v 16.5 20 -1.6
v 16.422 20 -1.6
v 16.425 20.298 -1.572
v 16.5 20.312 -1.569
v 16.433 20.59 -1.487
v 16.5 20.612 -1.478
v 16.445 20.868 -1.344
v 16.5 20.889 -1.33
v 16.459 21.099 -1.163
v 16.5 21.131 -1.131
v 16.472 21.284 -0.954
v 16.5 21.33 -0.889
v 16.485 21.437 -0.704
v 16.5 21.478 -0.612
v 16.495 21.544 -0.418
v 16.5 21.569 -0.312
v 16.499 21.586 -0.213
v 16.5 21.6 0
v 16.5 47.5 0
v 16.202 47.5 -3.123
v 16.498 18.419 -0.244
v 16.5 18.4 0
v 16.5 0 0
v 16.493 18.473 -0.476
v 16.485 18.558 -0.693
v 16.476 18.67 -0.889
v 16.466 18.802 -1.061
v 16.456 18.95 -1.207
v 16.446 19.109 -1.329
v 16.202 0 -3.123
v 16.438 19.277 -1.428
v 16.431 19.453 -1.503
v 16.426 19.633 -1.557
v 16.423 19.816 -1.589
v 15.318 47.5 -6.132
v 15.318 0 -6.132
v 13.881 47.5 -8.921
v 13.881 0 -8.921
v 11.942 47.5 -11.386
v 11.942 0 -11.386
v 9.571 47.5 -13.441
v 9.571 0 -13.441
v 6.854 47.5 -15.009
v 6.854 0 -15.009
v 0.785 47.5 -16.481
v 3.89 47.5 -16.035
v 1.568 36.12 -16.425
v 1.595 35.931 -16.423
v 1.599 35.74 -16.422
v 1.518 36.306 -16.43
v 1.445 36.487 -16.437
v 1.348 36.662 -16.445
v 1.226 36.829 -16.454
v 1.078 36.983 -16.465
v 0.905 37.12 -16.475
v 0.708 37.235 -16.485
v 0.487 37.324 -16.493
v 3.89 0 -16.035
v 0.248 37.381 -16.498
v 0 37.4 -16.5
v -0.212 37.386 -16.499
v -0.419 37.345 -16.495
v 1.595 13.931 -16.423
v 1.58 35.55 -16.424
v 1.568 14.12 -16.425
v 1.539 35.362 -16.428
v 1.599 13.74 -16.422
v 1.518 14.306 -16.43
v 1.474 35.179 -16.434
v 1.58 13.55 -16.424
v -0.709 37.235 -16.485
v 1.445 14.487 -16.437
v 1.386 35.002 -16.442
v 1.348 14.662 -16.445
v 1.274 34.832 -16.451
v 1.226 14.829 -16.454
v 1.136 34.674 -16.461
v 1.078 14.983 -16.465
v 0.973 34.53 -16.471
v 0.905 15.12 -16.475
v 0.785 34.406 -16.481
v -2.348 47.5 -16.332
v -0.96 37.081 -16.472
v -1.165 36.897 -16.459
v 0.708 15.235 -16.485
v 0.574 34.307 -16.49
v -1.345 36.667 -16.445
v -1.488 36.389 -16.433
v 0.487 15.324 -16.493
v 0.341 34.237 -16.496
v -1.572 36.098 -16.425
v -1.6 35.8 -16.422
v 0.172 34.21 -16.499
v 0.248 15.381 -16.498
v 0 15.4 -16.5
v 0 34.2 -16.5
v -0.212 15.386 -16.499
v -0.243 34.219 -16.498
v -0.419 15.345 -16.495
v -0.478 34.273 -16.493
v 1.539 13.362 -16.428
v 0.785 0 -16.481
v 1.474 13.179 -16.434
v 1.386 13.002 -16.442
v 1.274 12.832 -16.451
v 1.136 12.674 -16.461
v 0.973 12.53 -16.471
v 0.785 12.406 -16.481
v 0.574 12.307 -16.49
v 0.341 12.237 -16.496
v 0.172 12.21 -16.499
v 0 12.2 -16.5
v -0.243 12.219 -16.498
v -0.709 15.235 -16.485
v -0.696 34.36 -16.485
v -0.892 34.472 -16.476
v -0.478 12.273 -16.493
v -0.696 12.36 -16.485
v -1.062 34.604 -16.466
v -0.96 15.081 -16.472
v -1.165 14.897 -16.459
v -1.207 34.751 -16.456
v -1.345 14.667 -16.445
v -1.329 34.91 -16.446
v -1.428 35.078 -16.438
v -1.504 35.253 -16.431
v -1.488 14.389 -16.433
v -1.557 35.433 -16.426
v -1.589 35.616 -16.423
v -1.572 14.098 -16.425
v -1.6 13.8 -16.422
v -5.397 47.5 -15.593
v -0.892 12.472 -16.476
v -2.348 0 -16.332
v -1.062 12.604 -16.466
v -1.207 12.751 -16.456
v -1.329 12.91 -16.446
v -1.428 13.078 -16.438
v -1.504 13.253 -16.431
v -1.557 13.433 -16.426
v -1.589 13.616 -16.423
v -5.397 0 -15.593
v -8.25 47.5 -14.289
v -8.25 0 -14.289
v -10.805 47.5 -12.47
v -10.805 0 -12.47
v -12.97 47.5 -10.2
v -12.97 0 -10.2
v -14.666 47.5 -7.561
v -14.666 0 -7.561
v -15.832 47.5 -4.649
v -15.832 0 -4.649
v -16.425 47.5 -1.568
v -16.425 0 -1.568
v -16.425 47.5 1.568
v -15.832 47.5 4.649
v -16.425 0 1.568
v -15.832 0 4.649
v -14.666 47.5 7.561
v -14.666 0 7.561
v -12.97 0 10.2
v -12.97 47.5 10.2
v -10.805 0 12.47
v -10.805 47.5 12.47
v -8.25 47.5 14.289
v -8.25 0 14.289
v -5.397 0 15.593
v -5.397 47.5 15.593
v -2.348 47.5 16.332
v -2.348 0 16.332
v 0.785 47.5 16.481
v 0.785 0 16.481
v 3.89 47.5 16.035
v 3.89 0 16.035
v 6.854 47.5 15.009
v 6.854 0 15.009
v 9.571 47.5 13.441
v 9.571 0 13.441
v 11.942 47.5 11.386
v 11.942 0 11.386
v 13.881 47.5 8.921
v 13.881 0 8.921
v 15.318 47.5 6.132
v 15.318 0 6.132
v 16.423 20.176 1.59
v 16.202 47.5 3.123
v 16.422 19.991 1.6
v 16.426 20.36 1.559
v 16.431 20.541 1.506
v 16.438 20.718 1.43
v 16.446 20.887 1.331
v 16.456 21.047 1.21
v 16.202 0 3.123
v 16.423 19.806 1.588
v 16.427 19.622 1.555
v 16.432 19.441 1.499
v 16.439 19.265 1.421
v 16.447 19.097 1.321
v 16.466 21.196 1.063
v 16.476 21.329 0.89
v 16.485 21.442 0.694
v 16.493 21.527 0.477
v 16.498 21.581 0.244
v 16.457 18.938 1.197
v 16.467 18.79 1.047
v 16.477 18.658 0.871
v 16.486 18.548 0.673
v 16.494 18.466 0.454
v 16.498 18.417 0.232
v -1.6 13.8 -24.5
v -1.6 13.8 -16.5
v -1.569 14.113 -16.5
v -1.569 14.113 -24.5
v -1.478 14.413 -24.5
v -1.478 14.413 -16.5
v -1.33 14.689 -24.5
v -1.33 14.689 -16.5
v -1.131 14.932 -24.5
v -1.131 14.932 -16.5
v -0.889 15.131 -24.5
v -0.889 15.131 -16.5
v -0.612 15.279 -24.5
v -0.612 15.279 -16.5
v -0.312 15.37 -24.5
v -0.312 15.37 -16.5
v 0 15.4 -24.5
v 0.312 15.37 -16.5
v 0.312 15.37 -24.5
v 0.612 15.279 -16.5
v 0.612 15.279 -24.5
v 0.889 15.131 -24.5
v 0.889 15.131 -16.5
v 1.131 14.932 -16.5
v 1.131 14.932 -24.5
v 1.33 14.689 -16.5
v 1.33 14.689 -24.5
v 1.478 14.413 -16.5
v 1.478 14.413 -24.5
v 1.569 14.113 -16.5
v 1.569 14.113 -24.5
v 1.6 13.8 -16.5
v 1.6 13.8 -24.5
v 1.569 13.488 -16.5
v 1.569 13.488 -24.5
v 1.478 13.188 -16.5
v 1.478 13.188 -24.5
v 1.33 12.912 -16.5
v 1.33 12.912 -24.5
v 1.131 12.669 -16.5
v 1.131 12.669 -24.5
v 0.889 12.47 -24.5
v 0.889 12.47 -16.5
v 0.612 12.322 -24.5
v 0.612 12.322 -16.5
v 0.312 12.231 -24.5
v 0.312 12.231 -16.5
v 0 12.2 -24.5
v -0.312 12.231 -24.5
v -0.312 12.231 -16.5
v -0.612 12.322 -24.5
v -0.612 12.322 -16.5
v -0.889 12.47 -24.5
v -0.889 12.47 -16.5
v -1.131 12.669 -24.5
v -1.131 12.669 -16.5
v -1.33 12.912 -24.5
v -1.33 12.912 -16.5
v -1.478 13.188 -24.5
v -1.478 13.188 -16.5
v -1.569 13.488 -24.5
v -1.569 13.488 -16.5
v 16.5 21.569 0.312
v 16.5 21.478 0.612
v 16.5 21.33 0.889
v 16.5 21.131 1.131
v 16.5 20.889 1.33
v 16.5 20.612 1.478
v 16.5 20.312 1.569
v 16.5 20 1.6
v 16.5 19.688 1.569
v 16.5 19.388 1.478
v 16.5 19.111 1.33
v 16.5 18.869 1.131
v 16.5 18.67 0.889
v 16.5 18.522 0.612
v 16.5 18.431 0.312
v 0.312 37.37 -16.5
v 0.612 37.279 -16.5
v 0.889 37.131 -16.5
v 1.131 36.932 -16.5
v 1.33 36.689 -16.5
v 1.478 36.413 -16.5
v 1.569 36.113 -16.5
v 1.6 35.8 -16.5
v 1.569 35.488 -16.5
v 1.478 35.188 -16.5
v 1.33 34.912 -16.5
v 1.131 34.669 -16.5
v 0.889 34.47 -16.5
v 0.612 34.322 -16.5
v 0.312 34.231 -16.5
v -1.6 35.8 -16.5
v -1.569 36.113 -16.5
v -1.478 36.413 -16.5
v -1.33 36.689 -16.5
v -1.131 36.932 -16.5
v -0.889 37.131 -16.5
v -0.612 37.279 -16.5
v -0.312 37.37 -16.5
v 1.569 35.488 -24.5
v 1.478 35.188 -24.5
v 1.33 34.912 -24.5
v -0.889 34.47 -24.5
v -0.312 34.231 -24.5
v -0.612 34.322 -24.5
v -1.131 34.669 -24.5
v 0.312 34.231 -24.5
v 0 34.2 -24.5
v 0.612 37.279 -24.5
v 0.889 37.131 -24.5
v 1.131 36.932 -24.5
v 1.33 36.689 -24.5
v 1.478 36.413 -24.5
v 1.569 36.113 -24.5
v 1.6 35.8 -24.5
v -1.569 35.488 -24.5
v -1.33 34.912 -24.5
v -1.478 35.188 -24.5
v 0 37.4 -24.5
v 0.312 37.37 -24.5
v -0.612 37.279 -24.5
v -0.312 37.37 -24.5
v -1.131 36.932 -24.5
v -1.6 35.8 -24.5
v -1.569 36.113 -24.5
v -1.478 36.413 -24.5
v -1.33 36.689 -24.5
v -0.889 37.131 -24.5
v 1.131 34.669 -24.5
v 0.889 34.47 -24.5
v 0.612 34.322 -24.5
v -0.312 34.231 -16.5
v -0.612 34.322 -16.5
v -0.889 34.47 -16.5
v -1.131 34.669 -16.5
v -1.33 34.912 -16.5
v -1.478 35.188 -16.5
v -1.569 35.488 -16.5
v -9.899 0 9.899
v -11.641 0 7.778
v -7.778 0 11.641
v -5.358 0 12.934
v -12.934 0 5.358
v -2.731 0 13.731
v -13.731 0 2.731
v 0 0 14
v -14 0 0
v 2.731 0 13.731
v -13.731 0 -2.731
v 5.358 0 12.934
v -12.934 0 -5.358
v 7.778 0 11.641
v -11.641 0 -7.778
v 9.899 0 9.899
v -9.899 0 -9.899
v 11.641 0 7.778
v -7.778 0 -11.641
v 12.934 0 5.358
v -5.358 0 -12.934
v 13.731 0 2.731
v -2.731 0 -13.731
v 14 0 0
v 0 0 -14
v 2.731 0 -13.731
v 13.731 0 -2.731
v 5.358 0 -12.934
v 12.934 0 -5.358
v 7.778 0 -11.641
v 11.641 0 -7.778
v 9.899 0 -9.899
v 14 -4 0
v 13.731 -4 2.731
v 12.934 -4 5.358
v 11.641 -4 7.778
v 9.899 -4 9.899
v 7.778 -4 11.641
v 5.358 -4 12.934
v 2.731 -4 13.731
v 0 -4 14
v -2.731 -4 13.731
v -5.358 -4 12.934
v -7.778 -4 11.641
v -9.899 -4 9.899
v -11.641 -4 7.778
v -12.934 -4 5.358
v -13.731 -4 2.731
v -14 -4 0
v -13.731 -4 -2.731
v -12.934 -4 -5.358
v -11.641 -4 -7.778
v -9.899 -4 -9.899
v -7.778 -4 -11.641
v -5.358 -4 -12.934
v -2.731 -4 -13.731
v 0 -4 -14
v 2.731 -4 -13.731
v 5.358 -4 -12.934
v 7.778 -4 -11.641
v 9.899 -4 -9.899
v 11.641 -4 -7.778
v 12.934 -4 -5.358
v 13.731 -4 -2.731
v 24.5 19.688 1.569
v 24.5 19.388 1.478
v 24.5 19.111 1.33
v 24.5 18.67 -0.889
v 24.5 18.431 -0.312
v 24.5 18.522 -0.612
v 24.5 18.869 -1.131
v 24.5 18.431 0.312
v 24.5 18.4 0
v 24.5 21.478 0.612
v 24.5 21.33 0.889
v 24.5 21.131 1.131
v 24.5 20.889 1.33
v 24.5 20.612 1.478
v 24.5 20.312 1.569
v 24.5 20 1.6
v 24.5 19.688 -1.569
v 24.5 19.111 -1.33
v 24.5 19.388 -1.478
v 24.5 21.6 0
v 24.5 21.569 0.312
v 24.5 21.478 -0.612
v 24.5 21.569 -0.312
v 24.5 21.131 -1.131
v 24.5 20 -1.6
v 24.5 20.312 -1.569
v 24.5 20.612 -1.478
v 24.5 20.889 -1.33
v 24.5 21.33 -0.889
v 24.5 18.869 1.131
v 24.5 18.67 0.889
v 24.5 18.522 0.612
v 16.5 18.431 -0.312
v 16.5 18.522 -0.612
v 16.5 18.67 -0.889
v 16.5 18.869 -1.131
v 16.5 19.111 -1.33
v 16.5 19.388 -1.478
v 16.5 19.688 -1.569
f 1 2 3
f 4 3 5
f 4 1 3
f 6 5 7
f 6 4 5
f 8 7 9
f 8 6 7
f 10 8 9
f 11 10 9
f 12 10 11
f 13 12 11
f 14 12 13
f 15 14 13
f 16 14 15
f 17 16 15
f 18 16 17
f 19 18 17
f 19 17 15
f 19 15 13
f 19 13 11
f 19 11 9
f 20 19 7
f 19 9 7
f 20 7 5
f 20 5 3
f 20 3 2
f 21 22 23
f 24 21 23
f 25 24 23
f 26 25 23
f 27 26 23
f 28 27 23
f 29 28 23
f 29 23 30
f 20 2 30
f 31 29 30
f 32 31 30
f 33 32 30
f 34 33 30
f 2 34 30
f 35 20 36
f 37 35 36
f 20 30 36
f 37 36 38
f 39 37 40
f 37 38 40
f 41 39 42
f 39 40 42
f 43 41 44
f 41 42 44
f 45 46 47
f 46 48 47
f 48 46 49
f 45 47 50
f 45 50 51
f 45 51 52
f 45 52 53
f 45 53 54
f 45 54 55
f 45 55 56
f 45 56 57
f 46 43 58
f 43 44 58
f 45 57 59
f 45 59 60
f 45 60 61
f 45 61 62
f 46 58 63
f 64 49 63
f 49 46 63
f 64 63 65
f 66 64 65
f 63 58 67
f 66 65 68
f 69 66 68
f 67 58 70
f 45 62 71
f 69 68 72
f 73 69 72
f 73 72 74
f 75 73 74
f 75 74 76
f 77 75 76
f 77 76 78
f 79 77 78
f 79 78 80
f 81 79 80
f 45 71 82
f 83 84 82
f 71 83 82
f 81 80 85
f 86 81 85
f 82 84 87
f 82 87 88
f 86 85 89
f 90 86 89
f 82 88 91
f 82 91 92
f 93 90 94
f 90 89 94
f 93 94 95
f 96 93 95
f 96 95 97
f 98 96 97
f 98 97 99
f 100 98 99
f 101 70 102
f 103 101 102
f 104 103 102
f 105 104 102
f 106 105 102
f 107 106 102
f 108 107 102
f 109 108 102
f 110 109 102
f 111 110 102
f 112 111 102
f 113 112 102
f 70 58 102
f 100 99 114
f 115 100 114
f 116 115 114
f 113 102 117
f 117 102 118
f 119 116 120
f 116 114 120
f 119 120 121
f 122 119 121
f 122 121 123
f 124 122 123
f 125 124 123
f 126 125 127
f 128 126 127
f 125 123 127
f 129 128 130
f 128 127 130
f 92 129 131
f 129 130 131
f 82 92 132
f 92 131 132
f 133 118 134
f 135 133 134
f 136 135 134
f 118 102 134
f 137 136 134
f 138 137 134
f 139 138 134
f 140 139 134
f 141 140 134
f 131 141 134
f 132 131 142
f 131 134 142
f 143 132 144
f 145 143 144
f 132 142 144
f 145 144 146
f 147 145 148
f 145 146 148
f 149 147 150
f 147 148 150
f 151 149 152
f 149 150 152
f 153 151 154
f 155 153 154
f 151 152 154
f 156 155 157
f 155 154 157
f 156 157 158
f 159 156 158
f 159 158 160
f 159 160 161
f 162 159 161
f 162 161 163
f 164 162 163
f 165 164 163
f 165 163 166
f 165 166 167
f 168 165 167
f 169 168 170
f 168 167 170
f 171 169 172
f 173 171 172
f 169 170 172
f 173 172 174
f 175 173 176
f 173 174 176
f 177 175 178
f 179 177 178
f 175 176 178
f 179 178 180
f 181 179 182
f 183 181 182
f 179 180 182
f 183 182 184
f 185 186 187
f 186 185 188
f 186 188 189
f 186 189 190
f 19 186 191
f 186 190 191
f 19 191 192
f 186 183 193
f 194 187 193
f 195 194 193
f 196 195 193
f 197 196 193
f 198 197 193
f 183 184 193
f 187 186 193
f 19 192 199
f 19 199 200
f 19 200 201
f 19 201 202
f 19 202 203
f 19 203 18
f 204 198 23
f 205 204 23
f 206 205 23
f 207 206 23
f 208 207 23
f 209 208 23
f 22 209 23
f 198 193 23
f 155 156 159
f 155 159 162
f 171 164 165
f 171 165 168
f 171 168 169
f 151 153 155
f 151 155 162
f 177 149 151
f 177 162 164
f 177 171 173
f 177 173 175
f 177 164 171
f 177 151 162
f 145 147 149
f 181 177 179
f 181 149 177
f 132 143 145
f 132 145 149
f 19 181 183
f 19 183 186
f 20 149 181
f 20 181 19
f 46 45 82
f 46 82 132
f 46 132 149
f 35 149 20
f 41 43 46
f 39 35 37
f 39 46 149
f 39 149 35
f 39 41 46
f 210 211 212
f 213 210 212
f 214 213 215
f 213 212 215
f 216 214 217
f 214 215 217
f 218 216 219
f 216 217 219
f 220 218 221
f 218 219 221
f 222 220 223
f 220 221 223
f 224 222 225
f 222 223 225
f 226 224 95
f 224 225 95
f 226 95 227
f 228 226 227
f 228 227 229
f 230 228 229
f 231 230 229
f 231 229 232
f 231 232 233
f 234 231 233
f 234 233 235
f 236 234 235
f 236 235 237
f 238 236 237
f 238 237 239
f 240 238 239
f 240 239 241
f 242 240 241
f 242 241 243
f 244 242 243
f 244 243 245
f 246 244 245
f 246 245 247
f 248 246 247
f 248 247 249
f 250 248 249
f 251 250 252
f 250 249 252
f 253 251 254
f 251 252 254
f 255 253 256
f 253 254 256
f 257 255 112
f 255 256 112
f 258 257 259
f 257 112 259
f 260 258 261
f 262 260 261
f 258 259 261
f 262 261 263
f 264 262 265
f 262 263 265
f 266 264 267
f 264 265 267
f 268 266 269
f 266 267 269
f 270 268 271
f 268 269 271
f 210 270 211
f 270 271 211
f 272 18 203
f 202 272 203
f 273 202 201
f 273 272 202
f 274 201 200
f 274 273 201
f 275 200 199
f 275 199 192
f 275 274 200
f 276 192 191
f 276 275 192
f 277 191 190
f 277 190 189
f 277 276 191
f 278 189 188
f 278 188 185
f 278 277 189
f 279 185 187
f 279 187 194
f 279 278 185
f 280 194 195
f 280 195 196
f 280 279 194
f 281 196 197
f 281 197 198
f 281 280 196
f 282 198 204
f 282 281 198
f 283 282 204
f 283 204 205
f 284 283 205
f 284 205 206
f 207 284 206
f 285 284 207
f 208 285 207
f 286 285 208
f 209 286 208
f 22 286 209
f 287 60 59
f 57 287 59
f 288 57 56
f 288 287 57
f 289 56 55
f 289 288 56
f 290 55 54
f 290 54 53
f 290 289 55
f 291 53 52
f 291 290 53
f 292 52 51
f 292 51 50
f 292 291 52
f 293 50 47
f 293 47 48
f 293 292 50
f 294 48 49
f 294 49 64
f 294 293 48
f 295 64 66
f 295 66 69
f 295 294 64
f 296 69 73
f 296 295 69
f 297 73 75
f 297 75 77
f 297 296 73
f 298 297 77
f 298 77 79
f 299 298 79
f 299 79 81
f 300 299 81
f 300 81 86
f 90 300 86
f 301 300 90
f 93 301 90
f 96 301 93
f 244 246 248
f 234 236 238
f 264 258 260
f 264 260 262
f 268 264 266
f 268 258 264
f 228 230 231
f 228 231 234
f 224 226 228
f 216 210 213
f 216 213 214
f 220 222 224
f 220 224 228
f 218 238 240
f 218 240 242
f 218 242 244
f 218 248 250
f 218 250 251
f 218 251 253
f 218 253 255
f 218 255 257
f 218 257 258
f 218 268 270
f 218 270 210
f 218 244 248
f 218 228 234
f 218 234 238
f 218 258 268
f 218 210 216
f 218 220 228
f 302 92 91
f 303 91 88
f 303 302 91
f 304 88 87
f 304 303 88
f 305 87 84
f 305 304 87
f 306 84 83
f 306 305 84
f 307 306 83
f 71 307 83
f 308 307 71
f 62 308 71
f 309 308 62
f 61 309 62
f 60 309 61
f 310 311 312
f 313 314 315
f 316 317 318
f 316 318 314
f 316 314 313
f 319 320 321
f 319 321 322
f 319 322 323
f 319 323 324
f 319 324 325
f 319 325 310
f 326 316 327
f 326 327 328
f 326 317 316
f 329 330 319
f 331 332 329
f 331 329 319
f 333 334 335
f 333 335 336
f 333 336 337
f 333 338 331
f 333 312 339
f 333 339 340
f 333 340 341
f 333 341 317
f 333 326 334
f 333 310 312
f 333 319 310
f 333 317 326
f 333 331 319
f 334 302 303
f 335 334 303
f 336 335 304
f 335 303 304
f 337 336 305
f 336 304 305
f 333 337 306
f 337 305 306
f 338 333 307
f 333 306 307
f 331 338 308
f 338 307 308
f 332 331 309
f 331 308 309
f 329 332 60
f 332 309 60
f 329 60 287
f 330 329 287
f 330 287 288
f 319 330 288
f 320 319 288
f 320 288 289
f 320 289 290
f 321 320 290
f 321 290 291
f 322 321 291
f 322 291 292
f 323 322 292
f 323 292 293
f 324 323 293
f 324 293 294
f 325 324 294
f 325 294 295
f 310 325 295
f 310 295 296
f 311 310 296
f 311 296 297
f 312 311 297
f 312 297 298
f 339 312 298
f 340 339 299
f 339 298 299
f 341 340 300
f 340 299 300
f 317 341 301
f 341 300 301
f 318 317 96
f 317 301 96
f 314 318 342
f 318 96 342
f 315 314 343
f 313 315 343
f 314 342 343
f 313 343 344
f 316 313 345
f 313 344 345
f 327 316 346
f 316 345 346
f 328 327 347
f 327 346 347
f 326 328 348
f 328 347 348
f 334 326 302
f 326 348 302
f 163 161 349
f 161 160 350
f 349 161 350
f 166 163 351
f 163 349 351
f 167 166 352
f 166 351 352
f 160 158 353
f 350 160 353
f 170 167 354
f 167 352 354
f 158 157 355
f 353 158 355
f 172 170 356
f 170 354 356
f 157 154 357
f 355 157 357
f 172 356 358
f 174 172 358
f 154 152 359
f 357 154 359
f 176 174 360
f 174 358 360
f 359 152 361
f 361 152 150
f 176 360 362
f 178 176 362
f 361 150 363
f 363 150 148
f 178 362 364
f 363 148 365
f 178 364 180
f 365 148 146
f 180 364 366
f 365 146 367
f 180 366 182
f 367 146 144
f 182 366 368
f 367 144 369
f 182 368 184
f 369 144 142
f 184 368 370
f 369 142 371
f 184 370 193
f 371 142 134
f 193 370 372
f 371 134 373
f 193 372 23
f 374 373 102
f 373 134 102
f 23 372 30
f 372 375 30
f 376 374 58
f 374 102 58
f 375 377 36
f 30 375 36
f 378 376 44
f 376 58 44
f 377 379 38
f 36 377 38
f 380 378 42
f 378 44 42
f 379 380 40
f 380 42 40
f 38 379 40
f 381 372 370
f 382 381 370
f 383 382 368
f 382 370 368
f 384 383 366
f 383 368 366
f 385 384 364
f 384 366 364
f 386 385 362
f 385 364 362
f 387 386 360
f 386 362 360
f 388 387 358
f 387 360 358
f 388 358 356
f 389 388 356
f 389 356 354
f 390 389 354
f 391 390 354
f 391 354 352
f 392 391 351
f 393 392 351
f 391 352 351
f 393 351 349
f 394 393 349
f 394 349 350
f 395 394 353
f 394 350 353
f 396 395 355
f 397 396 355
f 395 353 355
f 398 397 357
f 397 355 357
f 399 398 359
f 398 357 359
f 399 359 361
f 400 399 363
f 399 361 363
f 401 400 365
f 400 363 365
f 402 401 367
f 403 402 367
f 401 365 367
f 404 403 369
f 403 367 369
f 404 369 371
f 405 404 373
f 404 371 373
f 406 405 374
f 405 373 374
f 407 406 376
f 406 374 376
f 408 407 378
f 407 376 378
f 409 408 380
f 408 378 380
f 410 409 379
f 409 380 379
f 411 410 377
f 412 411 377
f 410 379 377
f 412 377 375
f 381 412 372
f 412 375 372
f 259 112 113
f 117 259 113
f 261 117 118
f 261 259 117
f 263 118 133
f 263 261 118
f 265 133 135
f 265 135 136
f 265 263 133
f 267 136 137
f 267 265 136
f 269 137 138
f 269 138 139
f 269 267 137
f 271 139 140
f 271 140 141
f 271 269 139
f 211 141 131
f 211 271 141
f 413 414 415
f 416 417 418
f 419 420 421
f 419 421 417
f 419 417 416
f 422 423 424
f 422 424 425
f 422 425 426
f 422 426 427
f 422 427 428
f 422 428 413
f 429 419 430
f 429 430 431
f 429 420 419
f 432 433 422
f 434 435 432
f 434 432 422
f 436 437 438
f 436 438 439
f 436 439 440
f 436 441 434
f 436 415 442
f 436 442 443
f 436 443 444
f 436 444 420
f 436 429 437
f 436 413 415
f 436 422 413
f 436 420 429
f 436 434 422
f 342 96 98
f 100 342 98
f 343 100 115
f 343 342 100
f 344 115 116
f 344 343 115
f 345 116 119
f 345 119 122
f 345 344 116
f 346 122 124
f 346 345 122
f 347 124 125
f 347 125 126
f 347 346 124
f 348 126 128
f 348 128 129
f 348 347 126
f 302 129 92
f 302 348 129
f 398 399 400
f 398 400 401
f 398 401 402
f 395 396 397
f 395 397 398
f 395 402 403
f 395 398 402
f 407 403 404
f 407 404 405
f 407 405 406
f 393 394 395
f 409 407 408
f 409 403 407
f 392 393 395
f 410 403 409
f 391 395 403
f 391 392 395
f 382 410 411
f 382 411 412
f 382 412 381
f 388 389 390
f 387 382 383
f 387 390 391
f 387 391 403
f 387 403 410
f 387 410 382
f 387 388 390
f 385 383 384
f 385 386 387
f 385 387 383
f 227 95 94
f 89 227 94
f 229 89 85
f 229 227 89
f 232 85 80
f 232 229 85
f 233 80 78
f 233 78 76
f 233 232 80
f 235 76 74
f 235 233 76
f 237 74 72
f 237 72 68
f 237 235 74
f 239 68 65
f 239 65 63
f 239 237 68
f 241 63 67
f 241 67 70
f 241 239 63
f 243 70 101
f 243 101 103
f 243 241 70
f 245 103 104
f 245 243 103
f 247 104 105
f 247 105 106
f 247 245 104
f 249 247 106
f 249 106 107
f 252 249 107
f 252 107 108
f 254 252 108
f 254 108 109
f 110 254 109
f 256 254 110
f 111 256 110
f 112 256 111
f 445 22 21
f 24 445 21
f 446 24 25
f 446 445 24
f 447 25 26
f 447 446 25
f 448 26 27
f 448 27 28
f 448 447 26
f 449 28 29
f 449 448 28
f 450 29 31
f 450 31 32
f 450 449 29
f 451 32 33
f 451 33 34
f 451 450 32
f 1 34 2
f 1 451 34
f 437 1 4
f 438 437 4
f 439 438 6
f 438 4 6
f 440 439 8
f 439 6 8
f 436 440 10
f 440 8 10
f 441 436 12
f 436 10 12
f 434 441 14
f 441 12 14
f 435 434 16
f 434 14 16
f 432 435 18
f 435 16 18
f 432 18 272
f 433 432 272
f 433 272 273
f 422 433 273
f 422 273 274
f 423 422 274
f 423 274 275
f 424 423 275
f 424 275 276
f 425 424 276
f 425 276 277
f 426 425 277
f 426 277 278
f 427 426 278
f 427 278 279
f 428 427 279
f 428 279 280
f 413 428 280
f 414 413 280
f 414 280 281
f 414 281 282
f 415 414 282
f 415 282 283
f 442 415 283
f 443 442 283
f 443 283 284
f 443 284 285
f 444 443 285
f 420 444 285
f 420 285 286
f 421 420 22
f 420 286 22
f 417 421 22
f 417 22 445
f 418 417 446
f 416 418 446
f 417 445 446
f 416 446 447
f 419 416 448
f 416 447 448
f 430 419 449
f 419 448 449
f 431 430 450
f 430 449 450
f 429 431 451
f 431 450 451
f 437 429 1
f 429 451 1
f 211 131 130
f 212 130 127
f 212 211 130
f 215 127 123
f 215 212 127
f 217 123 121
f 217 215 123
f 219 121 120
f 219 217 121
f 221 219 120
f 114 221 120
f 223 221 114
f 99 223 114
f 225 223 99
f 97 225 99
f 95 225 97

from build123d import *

# Parameters (mm, degrees)
SKETCH1_R                = 16.5
BOSS_EXTRUDE1_DEPTH      = 47.5
SKETCH2_R                = 14
BOSS_EXTRUDE2_DEPTH      = 4
BOSS_EXTRUDE3_DEPTH      = 8
BOSS_EXTRUDE3_DEPTH_BACK = 1
SKETCH4_R                = 1.6
BOSS_EXTRUDE4_DEPTH      = 8
BOSS_EXTRUDE4_DEPTH_BACK = 1
SKETCH5_R                = 1.6


with BuildPart() as part:
    # Sketch1 → Boss-Extrude1 (new body)
    with BuildSketch(Plane(origin=(0, 0, 0), x_dir=(1, 0, 0), z_dir=(0, 1, 0))):
        Circle(SKETCH1_R)
    extrude(amount=BOSS_EXTRUDE1_DEPTH)

    # Sketch2 → Boss-Extrude2 (add)
    with BuildSketch(Plane.XZ):
        Circle(SKETCH2_R)
    extrude(amount=BOSS_EXTRUDE2_DEPTH)

    # Sketch4 → Boss-Extrude3 (add, two sides: drawn at the far end of the back side and taken through both)
    with BuildSketch(Plane(origin=(0, 0, -16.5), x_dir=(-1, 0, 0), z_dir=(0, 0, -1)).offset(-BOSS_EXTRUDE3_DEPTH_BACK)):
        with Locations((0, 35.800460913)):
            Circle(SKETCH4_R)
        with Locations((0, 13.800460913)):
            Circle(SKETCH4_R)
    extrude(amount=BOSS_EXTRUDE3_DEPTH + BOSS_EXTRUDE3_DEPTH_BACK)

    # Sketch5 → Boss-Extrude4 (add, two sides: drawn at the far end of the back side and taken through both)
    with BuildSketch(Plane(origin=(16.5, 0, 0), x_dir=(0, 0, -1), z_dir=(1, 0, 0)).offset(-BOSS_EXTRUDE4_DEPTH_BACK)):
        with Locations((0, 20)):
            Circle(SKETCH5_R)
    extrude(amount=BOSS_EXTRUDE4_DEPTH + BOSS_EXTRUDE4_DEPTH_BACK)


solid = part.part
